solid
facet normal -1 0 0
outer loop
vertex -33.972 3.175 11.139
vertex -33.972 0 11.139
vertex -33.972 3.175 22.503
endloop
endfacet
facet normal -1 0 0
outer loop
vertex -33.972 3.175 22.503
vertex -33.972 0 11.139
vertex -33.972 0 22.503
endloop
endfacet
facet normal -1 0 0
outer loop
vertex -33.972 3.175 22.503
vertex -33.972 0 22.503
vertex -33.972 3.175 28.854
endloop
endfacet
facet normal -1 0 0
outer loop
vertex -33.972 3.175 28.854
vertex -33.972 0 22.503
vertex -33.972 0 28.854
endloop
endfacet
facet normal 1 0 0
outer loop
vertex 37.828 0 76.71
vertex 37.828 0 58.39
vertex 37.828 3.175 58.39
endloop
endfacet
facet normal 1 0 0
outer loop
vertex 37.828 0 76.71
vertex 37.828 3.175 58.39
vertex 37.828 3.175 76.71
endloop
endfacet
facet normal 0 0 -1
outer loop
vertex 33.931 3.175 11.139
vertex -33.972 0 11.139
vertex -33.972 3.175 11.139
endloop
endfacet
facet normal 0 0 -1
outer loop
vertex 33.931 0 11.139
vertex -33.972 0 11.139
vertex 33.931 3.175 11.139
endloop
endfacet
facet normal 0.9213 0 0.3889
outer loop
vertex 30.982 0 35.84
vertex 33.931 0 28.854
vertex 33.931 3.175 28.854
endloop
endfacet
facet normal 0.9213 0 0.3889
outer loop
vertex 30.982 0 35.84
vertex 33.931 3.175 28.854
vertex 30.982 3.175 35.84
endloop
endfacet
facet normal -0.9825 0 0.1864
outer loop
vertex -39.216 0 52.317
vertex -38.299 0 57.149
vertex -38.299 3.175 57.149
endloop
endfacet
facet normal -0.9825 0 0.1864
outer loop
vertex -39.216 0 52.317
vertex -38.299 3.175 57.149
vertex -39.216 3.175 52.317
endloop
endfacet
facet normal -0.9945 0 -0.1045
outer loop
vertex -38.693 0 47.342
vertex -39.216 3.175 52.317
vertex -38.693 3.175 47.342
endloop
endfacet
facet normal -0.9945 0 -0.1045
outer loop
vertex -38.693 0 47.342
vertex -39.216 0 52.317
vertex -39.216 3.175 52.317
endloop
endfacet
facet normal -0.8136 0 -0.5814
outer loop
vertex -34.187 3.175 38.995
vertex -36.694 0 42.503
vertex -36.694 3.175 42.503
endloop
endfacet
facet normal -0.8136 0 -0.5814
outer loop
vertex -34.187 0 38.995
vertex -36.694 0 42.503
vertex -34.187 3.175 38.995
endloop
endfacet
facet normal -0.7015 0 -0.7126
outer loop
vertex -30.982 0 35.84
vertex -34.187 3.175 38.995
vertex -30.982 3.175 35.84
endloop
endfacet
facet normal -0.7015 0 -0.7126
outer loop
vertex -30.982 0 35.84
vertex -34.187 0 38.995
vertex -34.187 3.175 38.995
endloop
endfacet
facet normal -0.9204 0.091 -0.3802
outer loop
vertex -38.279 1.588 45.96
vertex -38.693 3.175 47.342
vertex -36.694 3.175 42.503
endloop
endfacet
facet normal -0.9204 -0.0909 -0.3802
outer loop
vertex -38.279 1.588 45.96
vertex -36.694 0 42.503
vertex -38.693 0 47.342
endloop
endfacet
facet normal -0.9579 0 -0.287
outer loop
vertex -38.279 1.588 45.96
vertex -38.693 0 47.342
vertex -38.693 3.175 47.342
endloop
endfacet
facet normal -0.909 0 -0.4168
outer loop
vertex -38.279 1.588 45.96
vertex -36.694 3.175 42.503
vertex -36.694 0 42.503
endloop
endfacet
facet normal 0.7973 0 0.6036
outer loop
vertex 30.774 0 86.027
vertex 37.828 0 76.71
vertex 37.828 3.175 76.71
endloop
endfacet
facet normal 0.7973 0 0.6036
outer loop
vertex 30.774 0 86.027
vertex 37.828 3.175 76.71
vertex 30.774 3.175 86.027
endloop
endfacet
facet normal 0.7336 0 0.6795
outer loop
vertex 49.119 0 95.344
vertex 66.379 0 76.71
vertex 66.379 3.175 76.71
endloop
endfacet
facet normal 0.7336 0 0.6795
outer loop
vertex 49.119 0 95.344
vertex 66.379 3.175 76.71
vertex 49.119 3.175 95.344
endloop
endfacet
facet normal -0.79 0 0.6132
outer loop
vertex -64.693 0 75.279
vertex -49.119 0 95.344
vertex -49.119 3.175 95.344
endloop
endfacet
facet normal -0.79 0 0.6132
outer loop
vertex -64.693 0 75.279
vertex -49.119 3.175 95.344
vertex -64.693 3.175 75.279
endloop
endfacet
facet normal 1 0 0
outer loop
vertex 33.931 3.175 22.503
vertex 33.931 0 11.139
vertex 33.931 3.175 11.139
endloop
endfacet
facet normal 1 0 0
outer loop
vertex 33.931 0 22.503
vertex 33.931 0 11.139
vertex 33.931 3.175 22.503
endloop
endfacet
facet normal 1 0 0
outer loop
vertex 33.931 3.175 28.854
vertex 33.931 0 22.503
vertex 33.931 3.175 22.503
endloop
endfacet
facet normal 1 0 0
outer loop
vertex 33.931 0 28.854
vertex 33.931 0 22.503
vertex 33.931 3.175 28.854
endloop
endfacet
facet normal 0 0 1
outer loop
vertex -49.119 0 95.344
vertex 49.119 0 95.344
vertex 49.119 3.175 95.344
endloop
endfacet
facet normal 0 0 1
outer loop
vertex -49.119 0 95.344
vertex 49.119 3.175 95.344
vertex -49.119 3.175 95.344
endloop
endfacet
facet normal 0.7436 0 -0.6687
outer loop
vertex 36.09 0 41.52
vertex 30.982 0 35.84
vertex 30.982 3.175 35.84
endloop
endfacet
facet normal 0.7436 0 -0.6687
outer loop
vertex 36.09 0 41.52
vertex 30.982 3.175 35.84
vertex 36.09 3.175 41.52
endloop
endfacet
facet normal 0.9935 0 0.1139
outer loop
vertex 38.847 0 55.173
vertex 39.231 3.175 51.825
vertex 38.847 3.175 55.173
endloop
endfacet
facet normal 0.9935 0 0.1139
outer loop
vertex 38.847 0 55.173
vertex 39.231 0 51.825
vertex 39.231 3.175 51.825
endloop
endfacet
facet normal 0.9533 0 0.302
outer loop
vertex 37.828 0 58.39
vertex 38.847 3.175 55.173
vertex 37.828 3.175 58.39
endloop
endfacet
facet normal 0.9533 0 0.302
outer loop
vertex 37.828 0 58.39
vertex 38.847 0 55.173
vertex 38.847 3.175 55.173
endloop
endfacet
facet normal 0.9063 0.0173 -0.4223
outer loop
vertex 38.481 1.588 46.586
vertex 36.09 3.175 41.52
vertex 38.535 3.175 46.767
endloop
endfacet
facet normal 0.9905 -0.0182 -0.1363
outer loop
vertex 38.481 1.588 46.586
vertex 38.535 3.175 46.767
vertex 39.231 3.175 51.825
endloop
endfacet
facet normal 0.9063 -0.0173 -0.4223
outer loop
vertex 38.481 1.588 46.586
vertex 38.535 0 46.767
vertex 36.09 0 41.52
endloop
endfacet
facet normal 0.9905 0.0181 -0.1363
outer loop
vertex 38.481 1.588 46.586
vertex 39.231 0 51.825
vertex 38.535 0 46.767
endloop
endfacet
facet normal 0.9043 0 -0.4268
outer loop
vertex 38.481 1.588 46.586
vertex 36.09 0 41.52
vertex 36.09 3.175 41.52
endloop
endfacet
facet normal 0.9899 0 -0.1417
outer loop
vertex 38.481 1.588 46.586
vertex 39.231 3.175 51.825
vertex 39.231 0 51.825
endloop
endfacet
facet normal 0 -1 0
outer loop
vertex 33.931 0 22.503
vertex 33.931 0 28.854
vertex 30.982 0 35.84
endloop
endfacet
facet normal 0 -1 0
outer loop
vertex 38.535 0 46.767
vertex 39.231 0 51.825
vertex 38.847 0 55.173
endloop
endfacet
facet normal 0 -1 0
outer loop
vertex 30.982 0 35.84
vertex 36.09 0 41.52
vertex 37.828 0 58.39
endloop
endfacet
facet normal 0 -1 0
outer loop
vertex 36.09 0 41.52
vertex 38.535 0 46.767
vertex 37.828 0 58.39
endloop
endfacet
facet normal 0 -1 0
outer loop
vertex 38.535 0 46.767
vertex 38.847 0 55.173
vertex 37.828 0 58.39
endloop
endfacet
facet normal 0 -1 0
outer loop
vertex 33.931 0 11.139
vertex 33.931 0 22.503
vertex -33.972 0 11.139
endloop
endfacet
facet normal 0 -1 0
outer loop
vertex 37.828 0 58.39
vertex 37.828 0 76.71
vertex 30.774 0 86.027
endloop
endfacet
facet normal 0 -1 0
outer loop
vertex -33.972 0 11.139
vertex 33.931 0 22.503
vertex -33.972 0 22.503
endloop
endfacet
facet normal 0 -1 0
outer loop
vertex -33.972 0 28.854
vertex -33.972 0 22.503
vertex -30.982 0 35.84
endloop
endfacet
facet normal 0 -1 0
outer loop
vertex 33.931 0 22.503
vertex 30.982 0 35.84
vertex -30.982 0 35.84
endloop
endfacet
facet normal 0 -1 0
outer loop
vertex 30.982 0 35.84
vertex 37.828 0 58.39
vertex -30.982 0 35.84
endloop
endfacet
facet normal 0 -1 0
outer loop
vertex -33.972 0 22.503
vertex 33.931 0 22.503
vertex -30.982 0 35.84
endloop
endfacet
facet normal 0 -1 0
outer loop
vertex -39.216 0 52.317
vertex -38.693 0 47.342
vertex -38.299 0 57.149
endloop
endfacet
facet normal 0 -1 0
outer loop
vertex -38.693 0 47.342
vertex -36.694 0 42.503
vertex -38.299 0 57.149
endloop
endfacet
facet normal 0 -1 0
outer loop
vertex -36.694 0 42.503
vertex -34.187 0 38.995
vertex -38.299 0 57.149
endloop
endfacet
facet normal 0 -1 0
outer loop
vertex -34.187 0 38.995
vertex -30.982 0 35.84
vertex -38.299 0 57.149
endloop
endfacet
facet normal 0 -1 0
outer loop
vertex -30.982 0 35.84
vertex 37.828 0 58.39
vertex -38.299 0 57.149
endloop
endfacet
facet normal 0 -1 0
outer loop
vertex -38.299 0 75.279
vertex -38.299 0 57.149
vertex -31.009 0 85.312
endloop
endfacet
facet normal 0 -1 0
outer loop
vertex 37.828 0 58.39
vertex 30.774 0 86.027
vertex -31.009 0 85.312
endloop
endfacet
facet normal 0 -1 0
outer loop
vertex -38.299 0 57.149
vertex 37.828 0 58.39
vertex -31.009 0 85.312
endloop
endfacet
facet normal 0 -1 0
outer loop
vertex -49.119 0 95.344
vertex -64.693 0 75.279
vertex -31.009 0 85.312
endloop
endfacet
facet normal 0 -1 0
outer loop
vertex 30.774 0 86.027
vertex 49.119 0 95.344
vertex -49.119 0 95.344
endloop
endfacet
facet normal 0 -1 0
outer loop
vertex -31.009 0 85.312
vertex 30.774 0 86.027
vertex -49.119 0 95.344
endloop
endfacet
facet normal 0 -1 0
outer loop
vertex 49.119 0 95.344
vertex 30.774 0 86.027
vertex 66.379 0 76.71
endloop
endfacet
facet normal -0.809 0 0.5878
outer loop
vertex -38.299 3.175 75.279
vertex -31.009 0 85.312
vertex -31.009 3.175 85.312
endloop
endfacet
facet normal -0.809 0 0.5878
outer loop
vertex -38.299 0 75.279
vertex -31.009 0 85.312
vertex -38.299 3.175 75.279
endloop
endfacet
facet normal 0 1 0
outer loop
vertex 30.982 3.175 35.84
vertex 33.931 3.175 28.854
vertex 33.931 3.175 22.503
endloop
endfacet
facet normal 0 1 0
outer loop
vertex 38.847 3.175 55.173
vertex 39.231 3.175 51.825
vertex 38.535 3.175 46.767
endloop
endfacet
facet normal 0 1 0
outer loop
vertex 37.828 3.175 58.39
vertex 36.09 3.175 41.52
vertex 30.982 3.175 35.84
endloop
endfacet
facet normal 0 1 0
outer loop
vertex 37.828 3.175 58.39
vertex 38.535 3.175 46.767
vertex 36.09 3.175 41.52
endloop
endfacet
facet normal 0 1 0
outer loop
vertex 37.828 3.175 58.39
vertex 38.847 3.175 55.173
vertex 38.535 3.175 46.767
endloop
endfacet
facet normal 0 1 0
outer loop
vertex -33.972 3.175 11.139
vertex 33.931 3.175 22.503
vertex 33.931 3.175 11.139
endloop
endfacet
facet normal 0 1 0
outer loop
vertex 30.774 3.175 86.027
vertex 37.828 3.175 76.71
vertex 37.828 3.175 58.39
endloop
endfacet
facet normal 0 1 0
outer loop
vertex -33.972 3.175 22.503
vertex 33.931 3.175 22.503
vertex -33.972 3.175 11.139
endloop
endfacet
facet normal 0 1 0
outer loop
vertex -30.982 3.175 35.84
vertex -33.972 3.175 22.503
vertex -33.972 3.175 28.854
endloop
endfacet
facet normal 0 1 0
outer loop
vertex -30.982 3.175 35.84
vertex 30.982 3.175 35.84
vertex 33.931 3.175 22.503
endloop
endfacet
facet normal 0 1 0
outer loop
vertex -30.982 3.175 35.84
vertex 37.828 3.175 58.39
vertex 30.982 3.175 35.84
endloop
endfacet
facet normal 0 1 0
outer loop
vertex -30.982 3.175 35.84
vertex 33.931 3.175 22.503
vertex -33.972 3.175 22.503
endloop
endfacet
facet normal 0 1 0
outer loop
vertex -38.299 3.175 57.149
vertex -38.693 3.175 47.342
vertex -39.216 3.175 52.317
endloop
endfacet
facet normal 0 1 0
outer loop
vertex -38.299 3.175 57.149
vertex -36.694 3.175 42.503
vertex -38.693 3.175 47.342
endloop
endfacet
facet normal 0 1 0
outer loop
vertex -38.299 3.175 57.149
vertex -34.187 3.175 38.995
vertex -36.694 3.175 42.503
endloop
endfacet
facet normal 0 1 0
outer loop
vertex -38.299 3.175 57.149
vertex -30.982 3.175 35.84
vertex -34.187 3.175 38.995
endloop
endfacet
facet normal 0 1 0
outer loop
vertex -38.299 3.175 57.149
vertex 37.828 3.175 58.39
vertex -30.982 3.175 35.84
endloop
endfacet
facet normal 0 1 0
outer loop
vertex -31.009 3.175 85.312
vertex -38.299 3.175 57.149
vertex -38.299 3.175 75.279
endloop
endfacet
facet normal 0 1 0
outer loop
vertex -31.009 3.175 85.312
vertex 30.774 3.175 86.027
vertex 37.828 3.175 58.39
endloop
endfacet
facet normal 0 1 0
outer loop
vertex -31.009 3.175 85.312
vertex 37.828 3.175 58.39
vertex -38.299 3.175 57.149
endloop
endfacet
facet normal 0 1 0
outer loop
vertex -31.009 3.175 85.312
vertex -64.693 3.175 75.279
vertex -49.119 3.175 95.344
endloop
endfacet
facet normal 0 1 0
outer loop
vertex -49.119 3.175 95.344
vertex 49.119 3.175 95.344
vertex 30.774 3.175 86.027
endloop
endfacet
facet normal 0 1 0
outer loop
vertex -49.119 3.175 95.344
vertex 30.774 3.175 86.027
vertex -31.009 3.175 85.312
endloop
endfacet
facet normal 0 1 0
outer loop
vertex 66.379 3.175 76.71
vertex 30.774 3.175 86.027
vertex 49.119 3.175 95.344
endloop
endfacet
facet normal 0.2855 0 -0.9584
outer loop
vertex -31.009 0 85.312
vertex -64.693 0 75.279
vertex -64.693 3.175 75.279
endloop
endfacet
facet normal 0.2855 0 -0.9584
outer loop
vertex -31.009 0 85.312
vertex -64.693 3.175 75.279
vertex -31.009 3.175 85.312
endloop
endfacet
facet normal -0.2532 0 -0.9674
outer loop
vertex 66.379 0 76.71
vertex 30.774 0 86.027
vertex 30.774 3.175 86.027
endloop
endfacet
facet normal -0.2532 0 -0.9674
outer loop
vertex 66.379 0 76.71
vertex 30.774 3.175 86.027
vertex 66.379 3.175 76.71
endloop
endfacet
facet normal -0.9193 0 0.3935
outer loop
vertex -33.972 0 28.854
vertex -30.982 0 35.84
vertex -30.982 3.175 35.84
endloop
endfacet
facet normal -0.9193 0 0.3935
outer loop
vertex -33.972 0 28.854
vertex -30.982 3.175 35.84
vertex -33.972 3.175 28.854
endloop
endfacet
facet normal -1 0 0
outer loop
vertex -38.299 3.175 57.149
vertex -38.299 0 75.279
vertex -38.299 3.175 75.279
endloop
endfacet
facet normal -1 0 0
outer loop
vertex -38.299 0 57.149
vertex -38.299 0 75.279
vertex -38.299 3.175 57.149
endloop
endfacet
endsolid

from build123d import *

# Parameters (mm, degrees)
F0_W     = 22.0716209825
F0_H     = 11.3639943302
F0_W_2   = 22.1128826787
F1_DEPTH = 3.175


with BuildPart() as f1:
    # F0 (on Front) → F1 (new body)
    with BuildSketch(Plane.XZ):
        with BuildLine():
            add(Edge.make_bspline(
                [(0, 77.2495130793), (-13.2024395854, 77.2495130793), (-23.7188442589, 72.0280801734)],
                knots=[1.5707963268, 1.5707963268, 1.5707963268, 2.2200254143, 2.2200254143, 2.2200254143], degree=2, weights=[1, 0.9477737356, 1]))
            ThreePointArc((0, 77.2495130793), (-14.9655593265, 88.7487135304), (-23.7188442589, 72.0280801734))
        make_face()
        with BuildLine():
            add(Edge.make_bspline(
                [(37.8281886895, 58.3899668587), (34.3045126324, 66.7722575902), (23.7188442589, 72.0280801734)],
                knots=[0.2683589556, 0.2683589556, 0.2683589556, 0.9215672393, 0.9215672393, 0.9215672393], degree=2, weights=[1, 0.9471372908, 1]))
            add(Edge.make_bspline(
                [(23.7188442589, 72.0280801734), (13.2024395854, 77.2495130793), (0, 77.2495130793)],
                knots=[0.9215672393, 0.9215672393, 0.9215672393, 1.5707963268, 1.5707963268, 1.5707963268], degree=2, weights=[1, 0.9477737356, 1]))
            add(Edge.make_bspline(
                [(0, 77.2495130793), (-13.2024395854, 77.2495130793), (-23.7188442589, 72.0280801734)],
                knots=[1.5707963268, 1.5707963268, 1.5707963268, 2.2200254143, 2.2200254143, 2.2200254143], degree=2, weights=[1, 0.9477737356, 1]))
            add(Edge.make_bspline(
                [(-23.7188442589, 72.0280801734), (-35.179956424, 66.3375965856), (-38.2993388492, 57.1490477352)],
                knots=[2.2200254143, 2.2200254143, 2.2200254143, 2.9230595545, 2.9230595545, 2.9230595545], degree=2, weights=[1, 0.9388514321, 1]))
            add(Edge.make_bspline(
                [(-38.2993388492, 57.1490477352), (-42.2983339169, 45.3694848208), (-30.9822451126, 35.8404089541)],
                knots=[2.9230595545, 2.9230595545, 2.9230595545, 3.8020524721, 3.8020524721, 3.8020524721], degree=2, weights=[1, 0.9049660266, 1]))
            Line((-30.9822451126, 35.8404089541), (-33.9723048082, 28.8538616849))
            Line((-33.9723048082, 28.8538616849), (-33.9723048082, 22.5029981736))
            Line((-33.9723048082, 22.5029981736), (-11.8594221295, 22.5029981736))
            Line((-11.8594221295, 22.5029981736), (-11.8594221295, 11.1390038435))
            Line((-11.8594221295, 11.1390038435), (11.8594221295, 11.1390038435))
            Line((11.8594221295, 11.1390038435), (11.8594221295, 22.5029981736))
            Line((11.8594221295, 22.5029981736), (33.931043112, 22.5029981736))
            Line((33.931043112, 22.5029981736), (33.931043112, 28.8538616849))
            Line((33.931043112, 28.8538616849), (30.9822451126, 35.8404089541))
            add(Edge.make_bspline(
                [(30.9822451126, 35.8404089541), (43.0393262584, 45.9934612106), (37.8281886895, 58.3899668587)],
                knots=[5.6227254887, 5.6227254887, 5.6227254887, 6.5515442627, 6.5515442627, 6.5515442627], degree=2, weights=[1, 0.894086254, 1]))
        make_face()
        with BuildLine():
            add(Edge.make_bspline(
                [(23.7188442589, 57.1490477352), (23.7188442589, 89.4658166317), (-16.7717556174, 66.614410199), (-57.2623554937, 43.7630037663), (0, 43.7630037663)],
                knots=[0, 0, 0, 2.3561944902, 2.3561944902, 4.7123889804, 4.7123889804, 4.7123889804], degree=2, weights=[1, 0.3826834324, 1, 0.3826834324, 1]))
            add(Edge.make_bspline(
                [(0, 43.7630037663), (23.7188442589, 43.7630037663), (23.7188442589, 57.1490477352)],
                knots=[4.7123889804, 4.7123889804, 4.7123889804, 6.2831853072, 6.2831853072, 6.2831853072], degree=2, weights=[1, 0.7071067812, 1]))
        make_face(mode=Mode.SUBTRACT)
        with Locations((22.8952326207, 16.8210010086)):
            Rectangle(F0_W, F0_H)
        with BuildLine():
            add(Edge.make_bspline(
                [(23.7188442589, 72.0280801734), (13.2024395854, 77.2495130793), (0, 77.2495130793)],
                knots=[0.9215672393, 0.9215672393, 0.9215672393, 1.5707963268, 1.5707963268, 1.5707963268], degree=2, weights=[1, 0.9477737356, 1]))
            ThreePointArc((23.7188442589, 72.0280801734), (14.8063132284, 88.0253233293), (0, 77.2495130793))
        make_face()
        with BuildLine():
            add(Edge.make_bspline(
                [(0, 43.7630037663), (23.7188442589, 43.7630037663), (23.7188442589, 57.1490477352)],
                knots=[4.7123889804, 4.7123889804, 4.7123889804, 6.2831853072, 6.2831853072, 6.2831853072], degree=2, weights=[1, 0.7071067812, 1]))
            add(Edge.make_bspline(
                [(23.7188442589, 57.1490477352), (23.7188442589, 89.4658166317), (-16.7717556174, 66.614410199), (-57.2623554937, 43.7630037663), (0, 43.7630037663)],
                knots=[0, 0, 0, 2.3561944902, 2.3561944902, 4.7123889804, 4.7123889804, 4.7123889804], degree=2, weights=[1, 0.3826834324, 1, 0.3826834324, 1]))
        make_face()
        with BuildLine():
            ThreePointArc((0, 77.2495130793), (14.8063132284, 88.0253233293), (23.7188442589, 72.0280801734))
            add(Edge.make_bspline(
                [(37.8281886895, 58.3899668587), (34.3045126324, 66.7722575902), (23.7188442589, 72.0280801734)],
                knots=[0.2683589556, 0.2683589556, 0.2683589556, 0.9215672393, 0.9215672393, 0.9215672393], degree=2, weights=[1, 0.9471372908, 1]))
            Line((37.8281886895, 58.3899668587), (37.8281886895, 76.7098173911))
            Line((37.8281886895, 76.7098173911), (30.7735164742, 86.026978908))
            Line((30.7735164742, 86.026978908), (66.3792615504, 76.7098173911))
            Line((66.3792615504, 76.7098173911), (49.1188442589, 95.3441404248))
            Line((49.1188442589, 95.3441404248), (23.7188442589, 95.3441404248))
            Line((23.7188442589, 95.3441404248), (-23.7188442589, 95.3441404248))
            Line((-23.7188442589, 95.3441404248), (-49.1188442589, 95.3441404248))
            Line((-49.1188442589, 95.3441404248), (-64.6933734609, 75.2793942231))
            Line((-64.6933734609, 75.2793942231), (-31.0090915541, 85.311767324))
            Line((-31.0090915541, 85.311767324), (-38.2993388492, 75.2793942231))
            Line((-38.2993388492, 75.2793942231), (-38.2993388492, 57.1490477352))
            add(Edge.make_bspline(
                [(-23.7188442589, 72.0280801734), (-35.179956424, 66.3375965856), (-38.2993388492, 57.1490477352)],
                knots=[2.2200254143, 2.2200254143, 2.2200254143, 2.9230595545, 2.9230595545, 2.9230595545], degree=2, weights=[1, 0.9388514321, 1]))
            ThreePointArc((-23.7188442589, 72.0280801734), (-14.9655593265, 88.7487135304), (0, 77.2495130793))
        make_face()
        with Locations((-22.9158634688, 16.8210010086)):
            Rectangle(F0_W_2, F0_H)
    extrude(amount=-F1_DEPTH)


solid = f1.part
